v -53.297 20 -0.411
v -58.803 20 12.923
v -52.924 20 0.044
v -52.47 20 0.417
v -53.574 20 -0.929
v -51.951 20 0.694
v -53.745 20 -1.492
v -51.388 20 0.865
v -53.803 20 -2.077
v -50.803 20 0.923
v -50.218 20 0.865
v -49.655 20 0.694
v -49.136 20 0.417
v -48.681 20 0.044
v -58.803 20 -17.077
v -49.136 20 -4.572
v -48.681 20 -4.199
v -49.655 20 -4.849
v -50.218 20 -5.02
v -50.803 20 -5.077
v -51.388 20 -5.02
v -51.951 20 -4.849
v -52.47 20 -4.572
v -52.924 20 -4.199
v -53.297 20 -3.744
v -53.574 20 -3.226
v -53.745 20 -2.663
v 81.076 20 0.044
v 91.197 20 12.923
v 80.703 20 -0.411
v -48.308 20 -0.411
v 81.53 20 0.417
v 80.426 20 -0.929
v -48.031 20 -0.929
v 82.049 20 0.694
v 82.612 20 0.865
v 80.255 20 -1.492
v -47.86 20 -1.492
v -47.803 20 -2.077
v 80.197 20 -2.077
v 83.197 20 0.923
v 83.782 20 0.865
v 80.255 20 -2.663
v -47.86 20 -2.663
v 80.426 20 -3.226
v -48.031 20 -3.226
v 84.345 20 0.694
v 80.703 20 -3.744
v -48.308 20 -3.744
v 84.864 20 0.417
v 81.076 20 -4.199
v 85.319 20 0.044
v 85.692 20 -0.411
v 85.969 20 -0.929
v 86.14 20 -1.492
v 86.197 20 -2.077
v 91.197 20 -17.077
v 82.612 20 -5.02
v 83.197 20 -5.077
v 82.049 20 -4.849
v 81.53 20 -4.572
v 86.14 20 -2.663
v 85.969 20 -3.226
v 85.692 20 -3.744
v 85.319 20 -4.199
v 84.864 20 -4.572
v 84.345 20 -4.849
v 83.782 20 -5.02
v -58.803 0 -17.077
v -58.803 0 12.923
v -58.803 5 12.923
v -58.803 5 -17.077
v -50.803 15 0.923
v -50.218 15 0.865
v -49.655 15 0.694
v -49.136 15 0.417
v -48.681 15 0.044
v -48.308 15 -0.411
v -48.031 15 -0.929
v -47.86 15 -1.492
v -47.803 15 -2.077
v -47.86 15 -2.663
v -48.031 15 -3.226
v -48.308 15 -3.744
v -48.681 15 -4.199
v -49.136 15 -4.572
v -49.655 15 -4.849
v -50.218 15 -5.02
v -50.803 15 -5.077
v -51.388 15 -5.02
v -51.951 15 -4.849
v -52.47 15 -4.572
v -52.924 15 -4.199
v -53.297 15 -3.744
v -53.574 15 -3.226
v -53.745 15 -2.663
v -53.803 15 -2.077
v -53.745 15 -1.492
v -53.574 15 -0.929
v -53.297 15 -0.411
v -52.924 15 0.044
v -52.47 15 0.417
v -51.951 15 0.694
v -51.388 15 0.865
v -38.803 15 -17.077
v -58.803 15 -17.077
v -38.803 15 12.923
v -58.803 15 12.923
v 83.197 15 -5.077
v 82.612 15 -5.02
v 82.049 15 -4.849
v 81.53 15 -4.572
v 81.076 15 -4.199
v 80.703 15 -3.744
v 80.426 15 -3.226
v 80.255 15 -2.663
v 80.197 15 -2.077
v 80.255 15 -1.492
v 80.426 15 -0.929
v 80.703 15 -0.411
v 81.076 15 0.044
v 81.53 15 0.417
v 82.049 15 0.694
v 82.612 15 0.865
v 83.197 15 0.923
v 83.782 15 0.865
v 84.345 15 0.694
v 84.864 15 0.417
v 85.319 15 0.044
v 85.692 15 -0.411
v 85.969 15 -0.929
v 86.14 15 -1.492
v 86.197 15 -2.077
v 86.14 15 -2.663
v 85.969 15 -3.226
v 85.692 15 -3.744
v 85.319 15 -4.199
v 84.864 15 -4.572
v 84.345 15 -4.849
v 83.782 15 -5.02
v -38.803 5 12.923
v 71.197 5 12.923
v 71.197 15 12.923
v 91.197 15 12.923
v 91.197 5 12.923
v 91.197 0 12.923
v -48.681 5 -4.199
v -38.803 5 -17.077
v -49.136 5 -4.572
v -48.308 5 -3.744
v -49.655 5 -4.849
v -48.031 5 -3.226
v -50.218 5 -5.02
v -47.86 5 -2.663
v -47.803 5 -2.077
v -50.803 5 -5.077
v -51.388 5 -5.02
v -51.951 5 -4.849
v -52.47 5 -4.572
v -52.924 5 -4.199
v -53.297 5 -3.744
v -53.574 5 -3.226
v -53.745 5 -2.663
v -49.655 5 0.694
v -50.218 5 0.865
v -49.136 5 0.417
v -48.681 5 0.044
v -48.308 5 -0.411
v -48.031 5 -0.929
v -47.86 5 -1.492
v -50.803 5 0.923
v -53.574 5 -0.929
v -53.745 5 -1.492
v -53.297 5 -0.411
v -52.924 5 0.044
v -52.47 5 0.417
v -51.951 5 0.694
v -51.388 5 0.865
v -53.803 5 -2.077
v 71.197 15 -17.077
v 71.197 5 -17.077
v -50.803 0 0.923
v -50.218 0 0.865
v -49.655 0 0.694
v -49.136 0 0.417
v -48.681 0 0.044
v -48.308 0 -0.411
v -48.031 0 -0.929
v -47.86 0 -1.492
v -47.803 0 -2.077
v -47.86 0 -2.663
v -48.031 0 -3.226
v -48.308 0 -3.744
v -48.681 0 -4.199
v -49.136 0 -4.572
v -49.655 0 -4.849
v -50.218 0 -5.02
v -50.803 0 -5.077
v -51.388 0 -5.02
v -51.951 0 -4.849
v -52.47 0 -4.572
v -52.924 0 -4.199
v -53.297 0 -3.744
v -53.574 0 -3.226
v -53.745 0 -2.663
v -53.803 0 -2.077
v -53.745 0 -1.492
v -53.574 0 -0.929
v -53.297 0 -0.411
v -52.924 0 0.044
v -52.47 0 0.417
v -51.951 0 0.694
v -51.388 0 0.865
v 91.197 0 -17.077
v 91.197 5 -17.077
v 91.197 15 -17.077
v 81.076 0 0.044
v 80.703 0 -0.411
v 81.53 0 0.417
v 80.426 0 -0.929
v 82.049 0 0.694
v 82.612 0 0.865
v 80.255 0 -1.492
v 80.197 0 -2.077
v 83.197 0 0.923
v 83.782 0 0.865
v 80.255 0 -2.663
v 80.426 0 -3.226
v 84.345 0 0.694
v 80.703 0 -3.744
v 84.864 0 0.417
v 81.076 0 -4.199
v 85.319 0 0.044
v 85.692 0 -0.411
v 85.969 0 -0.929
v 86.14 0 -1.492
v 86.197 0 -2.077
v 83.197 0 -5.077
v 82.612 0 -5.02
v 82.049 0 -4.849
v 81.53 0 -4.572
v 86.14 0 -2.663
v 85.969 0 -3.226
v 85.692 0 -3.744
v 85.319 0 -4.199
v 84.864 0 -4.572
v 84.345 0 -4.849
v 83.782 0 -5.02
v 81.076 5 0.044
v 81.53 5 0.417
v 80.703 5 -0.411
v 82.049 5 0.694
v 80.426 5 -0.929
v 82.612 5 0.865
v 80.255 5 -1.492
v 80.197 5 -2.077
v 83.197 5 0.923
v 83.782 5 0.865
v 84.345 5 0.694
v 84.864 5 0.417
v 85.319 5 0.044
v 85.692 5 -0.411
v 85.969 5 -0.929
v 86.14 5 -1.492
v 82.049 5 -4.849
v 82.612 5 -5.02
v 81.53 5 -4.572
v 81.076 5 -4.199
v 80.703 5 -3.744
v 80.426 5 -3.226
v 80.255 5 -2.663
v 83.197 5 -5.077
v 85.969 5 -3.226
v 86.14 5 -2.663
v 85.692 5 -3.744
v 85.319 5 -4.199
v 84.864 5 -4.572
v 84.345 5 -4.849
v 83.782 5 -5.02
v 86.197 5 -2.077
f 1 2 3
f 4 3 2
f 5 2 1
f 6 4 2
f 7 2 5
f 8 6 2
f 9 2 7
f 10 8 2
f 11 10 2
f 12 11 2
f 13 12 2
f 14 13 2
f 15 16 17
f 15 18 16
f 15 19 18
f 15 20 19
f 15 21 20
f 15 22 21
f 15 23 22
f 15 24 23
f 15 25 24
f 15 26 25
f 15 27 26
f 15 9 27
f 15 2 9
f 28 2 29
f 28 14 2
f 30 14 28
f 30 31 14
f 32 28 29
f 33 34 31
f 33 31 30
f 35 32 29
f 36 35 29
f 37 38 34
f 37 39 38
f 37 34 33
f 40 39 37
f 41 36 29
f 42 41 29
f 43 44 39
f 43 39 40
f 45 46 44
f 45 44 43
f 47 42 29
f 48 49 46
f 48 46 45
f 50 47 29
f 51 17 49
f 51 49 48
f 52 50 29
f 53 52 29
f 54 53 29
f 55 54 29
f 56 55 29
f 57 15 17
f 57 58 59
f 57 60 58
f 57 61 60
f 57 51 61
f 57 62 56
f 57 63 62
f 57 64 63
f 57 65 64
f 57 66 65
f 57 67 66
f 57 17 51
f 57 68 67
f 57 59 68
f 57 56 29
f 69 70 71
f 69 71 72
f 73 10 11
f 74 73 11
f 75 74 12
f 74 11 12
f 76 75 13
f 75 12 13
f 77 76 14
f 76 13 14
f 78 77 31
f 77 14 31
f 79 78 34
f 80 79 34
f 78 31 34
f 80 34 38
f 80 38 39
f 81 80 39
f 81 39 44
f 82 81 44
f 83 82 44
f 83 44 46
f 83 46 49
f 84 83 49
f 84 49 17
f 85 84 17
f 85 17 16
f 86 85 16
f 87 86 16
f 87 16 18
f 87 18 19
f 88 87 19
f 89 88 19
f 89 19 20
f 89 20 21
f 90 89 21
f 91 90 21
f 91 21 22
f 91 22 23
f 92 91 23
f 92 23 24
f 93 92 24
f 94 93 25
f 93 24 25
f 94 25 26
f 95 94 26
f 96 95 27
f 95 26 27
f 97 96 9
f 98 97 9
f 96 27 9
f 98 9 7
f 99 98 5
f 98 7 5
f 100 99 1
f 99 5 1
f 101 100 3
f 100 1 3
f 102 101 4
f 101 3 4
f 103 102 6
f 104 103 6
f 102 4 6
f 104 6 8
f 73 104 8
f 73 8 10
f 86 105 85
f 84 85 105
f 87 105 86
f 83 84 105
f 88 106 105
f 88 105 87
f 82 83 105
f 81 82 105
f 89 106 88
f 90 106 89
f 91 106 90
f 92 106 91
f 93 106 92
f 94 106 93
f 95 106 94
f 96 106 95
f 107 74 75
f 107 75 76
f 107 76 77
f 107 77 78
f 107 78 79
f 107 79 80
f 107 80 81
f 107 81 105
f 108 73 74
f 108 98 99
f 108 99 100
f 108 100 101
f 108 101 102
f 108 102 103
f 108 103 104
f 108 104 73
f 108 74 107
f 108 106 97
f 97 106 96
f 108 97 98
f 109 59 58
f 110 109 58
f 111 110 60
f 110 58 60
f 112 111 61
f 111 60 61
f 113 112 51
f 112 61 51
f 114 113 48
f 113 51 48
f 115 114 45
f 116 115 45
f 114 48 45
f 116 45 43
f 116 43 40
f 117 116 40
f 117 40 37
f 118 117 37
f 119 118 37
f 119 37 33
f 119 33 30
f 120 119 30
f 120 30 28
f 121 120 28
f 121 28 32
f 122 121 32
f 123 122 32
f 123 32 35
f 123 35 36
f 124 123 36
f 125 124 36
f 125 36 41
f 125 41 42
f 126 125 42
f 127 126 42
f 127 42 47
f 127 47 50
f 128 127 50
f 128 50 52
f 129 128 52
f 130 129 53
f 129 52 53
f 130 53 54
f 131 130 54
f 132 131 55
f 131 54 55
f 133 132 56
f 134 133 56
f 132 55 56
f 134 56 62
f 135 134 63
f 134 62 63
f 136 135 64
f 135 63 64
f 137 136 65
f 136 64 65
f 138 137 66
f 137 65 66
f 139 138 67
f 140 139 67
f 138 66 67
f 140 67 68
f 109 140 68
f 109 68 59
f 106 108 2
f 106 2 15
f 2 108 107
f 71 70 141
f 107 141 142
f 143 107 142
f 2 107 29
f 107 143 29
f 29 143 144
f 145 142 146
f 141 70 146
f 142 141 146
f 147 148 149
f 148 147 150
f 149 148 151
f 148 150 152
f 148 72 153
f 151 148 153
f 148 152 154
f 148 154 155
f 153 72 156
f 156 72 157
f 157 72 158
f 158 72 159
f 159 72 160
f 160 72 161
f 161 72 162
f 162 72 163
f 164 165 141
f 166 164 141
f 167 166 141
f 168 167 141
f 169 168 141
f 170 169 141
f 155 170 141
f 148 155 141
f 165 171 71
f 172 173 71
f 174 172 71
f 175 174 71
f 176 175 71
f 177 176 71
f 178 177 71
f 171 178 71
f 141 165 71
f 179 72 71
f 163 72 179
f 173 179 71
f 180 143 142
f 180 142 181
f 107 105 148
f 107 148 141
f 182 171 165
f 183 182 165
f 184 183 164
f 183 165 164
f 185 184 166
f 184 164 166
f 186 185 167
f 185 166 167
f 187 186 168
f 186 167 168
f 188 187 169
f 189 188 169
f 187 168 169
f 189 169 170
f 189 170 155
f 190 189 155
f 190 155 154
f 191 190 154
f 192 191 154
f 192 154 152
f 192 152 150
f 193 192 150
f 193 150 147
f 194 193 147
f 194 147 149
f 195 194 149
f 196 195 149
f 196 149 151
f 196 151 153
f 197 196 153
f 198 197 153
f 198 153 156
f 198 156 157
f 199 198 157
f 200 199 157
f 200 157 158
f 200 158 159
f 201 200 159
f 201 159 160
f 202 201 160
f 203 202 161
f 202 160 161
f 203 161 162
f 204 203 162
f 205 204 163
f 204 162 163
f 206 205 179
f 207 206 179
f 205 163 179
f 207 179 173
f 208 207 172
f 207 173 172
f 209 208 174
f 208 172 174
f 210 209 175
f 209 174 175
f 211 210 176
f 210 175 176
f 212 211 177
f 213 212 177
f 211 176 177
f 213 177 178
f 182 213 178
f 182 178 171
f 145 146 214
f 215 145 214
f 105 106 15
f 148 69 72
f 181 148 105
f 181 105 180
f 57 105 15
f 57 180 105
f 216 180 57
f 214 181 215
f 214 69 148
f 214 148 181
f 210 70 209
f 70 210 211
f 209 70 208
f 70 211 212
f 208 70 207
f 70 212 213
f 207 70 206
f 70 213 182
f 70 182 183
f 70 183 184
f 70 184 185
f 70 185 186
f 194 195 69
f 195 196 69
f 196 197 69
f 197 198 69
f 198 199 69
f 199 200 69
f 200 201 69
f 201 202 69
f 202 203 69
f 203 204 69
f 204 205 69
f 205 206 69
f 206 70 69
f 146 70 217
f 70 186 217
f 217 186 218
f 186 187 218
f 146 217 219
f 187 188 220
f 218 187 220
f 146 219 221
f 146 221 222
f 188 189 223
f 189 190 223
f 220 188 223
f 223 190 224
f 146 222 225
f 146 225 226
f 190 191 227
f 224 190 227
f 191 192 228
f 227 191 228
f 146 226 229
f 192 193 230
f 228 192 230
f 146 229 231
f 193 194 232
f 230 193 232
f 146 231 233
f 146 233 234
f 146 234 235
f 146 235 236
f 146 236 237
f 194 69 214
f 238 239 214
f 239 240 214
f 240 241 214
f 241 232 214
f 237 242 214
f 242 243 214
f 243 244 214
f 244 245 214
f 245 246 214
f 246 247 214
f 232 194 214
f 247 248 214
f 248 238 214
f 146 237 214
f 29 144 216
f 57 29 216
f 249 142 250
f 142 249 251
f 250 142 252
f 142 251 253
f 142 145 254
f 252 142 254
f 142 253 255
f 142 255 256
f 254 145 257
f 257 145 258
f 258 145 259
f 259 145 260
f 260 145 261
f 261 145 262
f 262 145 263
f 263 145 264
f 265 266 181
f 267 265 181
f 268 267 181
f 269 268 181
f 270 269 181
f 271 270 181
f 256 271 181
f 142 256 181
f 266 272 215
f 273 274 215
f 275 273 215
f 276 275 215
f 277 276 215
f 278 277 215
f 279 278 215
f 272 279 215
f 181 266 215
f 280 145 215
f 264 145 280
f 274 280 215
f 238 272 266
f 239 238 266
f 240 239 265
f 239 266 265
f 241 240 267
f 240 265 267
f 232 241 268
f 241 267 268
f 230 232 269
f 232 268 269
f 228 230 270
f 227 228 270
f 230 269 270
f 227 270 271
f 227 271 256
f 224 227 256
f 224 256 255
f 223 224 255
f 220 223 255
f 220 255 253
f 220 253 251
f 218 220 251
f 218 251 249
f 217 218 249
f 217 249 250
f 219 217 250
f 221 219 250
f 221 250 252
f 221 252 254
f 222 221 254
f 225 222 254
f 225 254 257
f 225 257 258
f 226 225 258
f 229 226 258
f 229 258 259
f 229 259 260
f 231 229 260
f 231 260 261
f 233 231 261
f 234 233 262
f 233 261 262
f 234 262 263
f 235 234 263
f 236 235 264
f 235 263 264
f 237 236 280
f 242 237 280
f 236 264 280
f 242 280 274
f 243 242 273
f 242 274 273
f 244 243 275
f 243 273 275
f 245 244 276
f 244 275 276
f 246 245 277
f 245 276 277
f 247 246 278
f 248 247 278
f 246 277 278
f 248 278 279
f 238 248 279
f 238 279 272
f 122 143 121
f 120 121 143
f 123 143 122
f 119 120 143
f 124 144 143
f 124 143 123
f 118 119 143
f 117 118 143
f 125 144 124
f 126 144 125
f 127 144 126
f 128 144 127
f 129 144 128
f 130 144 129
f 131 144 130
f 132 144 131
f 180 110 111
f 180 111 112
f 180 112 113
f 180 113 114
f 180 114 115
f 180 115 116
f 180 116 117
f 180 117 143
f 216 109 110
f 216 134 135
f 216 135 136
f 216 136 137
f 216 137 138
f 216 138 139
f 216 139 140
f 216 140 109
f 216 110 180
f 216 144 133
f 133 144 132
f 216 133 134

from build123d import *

# Parameters (mm, degrees)
SKETCH1_W           = 150
SKETCH1_H           = 30
BOSS_EXTRUDE1_DEPTH = 20
SKETCH2_R           = 3
CUT_EXTRUDE1_DEPTH  = 20
SKETCH3_W           = 30
SKETCH3_H           = 10
CUT_EXTRUDE2_DEPTH  = 20
SKETCH4_W           = 30
SKETCH4_H           = 10
CUT_EXTRUDE3_DEPTH  = 20


with BuildPart() as part:
    # Sketch1 → Boss-Extrude1 (new body)
    with BuildSketch(Plane(origin=(0, 0, 0), x_dir=(1, 0, 0), z_dir=(0, 1, 0))):
        with Locations((16.197183099, 2.077464789)):
            Rectangle(SKETCH1_W, SKETCH1_H)
    extrude(amount=BOSS_EXTRUDE1_DEPTH)

    # Sketch2 → Cut-Extrude1 (cut)
    with BuildSketch(Plane(origin=(0, 20, 0), x_dir=(1, 0, 0), z_dir=(0, 1, 0))):
        with Locations(Location((-50.802816901, 2.077464789, 0), (0, 0, 270))):
            Circle(SKETCH2_R)
        with Locations(Location((83.197183099, 2.077464789, 0), (0, 0, 90))):
            Circle(SKETCH2_R)
    extrude(amount=-CUT_EXTRUDE1_DEPTH, mode=Mode.SUBTRACT)

    # Sketch3 → Cut-Extrude2 (cut)
    with BuildSketch(Plane.ZY.offset(58.802816901)):
        with Locations((-2.077464789, 10)):
            Rectangle(SKETCH3_W, SKETCH3_H)
    extrude(amount=-CUT_EXTRUDE2_DEPTH, mode=Mode.SUBTRACT)

    # Sketch4 → Cut-Extrude3 (cut)
    with BuildSketch(Plane(origin=(91.197183099, 0, 0), x_dir=(0, 0, -1), z_dir=(1, 0, 0))):
        with Locations((2.077464789, 10)):
            Rectangle(SKETCH4_W, SKETCH4_H)
    extrude(amount=-CUT_EXTRUDE3_DEPTH, mode=Mode.SUBTRACT)


solid = part.part
